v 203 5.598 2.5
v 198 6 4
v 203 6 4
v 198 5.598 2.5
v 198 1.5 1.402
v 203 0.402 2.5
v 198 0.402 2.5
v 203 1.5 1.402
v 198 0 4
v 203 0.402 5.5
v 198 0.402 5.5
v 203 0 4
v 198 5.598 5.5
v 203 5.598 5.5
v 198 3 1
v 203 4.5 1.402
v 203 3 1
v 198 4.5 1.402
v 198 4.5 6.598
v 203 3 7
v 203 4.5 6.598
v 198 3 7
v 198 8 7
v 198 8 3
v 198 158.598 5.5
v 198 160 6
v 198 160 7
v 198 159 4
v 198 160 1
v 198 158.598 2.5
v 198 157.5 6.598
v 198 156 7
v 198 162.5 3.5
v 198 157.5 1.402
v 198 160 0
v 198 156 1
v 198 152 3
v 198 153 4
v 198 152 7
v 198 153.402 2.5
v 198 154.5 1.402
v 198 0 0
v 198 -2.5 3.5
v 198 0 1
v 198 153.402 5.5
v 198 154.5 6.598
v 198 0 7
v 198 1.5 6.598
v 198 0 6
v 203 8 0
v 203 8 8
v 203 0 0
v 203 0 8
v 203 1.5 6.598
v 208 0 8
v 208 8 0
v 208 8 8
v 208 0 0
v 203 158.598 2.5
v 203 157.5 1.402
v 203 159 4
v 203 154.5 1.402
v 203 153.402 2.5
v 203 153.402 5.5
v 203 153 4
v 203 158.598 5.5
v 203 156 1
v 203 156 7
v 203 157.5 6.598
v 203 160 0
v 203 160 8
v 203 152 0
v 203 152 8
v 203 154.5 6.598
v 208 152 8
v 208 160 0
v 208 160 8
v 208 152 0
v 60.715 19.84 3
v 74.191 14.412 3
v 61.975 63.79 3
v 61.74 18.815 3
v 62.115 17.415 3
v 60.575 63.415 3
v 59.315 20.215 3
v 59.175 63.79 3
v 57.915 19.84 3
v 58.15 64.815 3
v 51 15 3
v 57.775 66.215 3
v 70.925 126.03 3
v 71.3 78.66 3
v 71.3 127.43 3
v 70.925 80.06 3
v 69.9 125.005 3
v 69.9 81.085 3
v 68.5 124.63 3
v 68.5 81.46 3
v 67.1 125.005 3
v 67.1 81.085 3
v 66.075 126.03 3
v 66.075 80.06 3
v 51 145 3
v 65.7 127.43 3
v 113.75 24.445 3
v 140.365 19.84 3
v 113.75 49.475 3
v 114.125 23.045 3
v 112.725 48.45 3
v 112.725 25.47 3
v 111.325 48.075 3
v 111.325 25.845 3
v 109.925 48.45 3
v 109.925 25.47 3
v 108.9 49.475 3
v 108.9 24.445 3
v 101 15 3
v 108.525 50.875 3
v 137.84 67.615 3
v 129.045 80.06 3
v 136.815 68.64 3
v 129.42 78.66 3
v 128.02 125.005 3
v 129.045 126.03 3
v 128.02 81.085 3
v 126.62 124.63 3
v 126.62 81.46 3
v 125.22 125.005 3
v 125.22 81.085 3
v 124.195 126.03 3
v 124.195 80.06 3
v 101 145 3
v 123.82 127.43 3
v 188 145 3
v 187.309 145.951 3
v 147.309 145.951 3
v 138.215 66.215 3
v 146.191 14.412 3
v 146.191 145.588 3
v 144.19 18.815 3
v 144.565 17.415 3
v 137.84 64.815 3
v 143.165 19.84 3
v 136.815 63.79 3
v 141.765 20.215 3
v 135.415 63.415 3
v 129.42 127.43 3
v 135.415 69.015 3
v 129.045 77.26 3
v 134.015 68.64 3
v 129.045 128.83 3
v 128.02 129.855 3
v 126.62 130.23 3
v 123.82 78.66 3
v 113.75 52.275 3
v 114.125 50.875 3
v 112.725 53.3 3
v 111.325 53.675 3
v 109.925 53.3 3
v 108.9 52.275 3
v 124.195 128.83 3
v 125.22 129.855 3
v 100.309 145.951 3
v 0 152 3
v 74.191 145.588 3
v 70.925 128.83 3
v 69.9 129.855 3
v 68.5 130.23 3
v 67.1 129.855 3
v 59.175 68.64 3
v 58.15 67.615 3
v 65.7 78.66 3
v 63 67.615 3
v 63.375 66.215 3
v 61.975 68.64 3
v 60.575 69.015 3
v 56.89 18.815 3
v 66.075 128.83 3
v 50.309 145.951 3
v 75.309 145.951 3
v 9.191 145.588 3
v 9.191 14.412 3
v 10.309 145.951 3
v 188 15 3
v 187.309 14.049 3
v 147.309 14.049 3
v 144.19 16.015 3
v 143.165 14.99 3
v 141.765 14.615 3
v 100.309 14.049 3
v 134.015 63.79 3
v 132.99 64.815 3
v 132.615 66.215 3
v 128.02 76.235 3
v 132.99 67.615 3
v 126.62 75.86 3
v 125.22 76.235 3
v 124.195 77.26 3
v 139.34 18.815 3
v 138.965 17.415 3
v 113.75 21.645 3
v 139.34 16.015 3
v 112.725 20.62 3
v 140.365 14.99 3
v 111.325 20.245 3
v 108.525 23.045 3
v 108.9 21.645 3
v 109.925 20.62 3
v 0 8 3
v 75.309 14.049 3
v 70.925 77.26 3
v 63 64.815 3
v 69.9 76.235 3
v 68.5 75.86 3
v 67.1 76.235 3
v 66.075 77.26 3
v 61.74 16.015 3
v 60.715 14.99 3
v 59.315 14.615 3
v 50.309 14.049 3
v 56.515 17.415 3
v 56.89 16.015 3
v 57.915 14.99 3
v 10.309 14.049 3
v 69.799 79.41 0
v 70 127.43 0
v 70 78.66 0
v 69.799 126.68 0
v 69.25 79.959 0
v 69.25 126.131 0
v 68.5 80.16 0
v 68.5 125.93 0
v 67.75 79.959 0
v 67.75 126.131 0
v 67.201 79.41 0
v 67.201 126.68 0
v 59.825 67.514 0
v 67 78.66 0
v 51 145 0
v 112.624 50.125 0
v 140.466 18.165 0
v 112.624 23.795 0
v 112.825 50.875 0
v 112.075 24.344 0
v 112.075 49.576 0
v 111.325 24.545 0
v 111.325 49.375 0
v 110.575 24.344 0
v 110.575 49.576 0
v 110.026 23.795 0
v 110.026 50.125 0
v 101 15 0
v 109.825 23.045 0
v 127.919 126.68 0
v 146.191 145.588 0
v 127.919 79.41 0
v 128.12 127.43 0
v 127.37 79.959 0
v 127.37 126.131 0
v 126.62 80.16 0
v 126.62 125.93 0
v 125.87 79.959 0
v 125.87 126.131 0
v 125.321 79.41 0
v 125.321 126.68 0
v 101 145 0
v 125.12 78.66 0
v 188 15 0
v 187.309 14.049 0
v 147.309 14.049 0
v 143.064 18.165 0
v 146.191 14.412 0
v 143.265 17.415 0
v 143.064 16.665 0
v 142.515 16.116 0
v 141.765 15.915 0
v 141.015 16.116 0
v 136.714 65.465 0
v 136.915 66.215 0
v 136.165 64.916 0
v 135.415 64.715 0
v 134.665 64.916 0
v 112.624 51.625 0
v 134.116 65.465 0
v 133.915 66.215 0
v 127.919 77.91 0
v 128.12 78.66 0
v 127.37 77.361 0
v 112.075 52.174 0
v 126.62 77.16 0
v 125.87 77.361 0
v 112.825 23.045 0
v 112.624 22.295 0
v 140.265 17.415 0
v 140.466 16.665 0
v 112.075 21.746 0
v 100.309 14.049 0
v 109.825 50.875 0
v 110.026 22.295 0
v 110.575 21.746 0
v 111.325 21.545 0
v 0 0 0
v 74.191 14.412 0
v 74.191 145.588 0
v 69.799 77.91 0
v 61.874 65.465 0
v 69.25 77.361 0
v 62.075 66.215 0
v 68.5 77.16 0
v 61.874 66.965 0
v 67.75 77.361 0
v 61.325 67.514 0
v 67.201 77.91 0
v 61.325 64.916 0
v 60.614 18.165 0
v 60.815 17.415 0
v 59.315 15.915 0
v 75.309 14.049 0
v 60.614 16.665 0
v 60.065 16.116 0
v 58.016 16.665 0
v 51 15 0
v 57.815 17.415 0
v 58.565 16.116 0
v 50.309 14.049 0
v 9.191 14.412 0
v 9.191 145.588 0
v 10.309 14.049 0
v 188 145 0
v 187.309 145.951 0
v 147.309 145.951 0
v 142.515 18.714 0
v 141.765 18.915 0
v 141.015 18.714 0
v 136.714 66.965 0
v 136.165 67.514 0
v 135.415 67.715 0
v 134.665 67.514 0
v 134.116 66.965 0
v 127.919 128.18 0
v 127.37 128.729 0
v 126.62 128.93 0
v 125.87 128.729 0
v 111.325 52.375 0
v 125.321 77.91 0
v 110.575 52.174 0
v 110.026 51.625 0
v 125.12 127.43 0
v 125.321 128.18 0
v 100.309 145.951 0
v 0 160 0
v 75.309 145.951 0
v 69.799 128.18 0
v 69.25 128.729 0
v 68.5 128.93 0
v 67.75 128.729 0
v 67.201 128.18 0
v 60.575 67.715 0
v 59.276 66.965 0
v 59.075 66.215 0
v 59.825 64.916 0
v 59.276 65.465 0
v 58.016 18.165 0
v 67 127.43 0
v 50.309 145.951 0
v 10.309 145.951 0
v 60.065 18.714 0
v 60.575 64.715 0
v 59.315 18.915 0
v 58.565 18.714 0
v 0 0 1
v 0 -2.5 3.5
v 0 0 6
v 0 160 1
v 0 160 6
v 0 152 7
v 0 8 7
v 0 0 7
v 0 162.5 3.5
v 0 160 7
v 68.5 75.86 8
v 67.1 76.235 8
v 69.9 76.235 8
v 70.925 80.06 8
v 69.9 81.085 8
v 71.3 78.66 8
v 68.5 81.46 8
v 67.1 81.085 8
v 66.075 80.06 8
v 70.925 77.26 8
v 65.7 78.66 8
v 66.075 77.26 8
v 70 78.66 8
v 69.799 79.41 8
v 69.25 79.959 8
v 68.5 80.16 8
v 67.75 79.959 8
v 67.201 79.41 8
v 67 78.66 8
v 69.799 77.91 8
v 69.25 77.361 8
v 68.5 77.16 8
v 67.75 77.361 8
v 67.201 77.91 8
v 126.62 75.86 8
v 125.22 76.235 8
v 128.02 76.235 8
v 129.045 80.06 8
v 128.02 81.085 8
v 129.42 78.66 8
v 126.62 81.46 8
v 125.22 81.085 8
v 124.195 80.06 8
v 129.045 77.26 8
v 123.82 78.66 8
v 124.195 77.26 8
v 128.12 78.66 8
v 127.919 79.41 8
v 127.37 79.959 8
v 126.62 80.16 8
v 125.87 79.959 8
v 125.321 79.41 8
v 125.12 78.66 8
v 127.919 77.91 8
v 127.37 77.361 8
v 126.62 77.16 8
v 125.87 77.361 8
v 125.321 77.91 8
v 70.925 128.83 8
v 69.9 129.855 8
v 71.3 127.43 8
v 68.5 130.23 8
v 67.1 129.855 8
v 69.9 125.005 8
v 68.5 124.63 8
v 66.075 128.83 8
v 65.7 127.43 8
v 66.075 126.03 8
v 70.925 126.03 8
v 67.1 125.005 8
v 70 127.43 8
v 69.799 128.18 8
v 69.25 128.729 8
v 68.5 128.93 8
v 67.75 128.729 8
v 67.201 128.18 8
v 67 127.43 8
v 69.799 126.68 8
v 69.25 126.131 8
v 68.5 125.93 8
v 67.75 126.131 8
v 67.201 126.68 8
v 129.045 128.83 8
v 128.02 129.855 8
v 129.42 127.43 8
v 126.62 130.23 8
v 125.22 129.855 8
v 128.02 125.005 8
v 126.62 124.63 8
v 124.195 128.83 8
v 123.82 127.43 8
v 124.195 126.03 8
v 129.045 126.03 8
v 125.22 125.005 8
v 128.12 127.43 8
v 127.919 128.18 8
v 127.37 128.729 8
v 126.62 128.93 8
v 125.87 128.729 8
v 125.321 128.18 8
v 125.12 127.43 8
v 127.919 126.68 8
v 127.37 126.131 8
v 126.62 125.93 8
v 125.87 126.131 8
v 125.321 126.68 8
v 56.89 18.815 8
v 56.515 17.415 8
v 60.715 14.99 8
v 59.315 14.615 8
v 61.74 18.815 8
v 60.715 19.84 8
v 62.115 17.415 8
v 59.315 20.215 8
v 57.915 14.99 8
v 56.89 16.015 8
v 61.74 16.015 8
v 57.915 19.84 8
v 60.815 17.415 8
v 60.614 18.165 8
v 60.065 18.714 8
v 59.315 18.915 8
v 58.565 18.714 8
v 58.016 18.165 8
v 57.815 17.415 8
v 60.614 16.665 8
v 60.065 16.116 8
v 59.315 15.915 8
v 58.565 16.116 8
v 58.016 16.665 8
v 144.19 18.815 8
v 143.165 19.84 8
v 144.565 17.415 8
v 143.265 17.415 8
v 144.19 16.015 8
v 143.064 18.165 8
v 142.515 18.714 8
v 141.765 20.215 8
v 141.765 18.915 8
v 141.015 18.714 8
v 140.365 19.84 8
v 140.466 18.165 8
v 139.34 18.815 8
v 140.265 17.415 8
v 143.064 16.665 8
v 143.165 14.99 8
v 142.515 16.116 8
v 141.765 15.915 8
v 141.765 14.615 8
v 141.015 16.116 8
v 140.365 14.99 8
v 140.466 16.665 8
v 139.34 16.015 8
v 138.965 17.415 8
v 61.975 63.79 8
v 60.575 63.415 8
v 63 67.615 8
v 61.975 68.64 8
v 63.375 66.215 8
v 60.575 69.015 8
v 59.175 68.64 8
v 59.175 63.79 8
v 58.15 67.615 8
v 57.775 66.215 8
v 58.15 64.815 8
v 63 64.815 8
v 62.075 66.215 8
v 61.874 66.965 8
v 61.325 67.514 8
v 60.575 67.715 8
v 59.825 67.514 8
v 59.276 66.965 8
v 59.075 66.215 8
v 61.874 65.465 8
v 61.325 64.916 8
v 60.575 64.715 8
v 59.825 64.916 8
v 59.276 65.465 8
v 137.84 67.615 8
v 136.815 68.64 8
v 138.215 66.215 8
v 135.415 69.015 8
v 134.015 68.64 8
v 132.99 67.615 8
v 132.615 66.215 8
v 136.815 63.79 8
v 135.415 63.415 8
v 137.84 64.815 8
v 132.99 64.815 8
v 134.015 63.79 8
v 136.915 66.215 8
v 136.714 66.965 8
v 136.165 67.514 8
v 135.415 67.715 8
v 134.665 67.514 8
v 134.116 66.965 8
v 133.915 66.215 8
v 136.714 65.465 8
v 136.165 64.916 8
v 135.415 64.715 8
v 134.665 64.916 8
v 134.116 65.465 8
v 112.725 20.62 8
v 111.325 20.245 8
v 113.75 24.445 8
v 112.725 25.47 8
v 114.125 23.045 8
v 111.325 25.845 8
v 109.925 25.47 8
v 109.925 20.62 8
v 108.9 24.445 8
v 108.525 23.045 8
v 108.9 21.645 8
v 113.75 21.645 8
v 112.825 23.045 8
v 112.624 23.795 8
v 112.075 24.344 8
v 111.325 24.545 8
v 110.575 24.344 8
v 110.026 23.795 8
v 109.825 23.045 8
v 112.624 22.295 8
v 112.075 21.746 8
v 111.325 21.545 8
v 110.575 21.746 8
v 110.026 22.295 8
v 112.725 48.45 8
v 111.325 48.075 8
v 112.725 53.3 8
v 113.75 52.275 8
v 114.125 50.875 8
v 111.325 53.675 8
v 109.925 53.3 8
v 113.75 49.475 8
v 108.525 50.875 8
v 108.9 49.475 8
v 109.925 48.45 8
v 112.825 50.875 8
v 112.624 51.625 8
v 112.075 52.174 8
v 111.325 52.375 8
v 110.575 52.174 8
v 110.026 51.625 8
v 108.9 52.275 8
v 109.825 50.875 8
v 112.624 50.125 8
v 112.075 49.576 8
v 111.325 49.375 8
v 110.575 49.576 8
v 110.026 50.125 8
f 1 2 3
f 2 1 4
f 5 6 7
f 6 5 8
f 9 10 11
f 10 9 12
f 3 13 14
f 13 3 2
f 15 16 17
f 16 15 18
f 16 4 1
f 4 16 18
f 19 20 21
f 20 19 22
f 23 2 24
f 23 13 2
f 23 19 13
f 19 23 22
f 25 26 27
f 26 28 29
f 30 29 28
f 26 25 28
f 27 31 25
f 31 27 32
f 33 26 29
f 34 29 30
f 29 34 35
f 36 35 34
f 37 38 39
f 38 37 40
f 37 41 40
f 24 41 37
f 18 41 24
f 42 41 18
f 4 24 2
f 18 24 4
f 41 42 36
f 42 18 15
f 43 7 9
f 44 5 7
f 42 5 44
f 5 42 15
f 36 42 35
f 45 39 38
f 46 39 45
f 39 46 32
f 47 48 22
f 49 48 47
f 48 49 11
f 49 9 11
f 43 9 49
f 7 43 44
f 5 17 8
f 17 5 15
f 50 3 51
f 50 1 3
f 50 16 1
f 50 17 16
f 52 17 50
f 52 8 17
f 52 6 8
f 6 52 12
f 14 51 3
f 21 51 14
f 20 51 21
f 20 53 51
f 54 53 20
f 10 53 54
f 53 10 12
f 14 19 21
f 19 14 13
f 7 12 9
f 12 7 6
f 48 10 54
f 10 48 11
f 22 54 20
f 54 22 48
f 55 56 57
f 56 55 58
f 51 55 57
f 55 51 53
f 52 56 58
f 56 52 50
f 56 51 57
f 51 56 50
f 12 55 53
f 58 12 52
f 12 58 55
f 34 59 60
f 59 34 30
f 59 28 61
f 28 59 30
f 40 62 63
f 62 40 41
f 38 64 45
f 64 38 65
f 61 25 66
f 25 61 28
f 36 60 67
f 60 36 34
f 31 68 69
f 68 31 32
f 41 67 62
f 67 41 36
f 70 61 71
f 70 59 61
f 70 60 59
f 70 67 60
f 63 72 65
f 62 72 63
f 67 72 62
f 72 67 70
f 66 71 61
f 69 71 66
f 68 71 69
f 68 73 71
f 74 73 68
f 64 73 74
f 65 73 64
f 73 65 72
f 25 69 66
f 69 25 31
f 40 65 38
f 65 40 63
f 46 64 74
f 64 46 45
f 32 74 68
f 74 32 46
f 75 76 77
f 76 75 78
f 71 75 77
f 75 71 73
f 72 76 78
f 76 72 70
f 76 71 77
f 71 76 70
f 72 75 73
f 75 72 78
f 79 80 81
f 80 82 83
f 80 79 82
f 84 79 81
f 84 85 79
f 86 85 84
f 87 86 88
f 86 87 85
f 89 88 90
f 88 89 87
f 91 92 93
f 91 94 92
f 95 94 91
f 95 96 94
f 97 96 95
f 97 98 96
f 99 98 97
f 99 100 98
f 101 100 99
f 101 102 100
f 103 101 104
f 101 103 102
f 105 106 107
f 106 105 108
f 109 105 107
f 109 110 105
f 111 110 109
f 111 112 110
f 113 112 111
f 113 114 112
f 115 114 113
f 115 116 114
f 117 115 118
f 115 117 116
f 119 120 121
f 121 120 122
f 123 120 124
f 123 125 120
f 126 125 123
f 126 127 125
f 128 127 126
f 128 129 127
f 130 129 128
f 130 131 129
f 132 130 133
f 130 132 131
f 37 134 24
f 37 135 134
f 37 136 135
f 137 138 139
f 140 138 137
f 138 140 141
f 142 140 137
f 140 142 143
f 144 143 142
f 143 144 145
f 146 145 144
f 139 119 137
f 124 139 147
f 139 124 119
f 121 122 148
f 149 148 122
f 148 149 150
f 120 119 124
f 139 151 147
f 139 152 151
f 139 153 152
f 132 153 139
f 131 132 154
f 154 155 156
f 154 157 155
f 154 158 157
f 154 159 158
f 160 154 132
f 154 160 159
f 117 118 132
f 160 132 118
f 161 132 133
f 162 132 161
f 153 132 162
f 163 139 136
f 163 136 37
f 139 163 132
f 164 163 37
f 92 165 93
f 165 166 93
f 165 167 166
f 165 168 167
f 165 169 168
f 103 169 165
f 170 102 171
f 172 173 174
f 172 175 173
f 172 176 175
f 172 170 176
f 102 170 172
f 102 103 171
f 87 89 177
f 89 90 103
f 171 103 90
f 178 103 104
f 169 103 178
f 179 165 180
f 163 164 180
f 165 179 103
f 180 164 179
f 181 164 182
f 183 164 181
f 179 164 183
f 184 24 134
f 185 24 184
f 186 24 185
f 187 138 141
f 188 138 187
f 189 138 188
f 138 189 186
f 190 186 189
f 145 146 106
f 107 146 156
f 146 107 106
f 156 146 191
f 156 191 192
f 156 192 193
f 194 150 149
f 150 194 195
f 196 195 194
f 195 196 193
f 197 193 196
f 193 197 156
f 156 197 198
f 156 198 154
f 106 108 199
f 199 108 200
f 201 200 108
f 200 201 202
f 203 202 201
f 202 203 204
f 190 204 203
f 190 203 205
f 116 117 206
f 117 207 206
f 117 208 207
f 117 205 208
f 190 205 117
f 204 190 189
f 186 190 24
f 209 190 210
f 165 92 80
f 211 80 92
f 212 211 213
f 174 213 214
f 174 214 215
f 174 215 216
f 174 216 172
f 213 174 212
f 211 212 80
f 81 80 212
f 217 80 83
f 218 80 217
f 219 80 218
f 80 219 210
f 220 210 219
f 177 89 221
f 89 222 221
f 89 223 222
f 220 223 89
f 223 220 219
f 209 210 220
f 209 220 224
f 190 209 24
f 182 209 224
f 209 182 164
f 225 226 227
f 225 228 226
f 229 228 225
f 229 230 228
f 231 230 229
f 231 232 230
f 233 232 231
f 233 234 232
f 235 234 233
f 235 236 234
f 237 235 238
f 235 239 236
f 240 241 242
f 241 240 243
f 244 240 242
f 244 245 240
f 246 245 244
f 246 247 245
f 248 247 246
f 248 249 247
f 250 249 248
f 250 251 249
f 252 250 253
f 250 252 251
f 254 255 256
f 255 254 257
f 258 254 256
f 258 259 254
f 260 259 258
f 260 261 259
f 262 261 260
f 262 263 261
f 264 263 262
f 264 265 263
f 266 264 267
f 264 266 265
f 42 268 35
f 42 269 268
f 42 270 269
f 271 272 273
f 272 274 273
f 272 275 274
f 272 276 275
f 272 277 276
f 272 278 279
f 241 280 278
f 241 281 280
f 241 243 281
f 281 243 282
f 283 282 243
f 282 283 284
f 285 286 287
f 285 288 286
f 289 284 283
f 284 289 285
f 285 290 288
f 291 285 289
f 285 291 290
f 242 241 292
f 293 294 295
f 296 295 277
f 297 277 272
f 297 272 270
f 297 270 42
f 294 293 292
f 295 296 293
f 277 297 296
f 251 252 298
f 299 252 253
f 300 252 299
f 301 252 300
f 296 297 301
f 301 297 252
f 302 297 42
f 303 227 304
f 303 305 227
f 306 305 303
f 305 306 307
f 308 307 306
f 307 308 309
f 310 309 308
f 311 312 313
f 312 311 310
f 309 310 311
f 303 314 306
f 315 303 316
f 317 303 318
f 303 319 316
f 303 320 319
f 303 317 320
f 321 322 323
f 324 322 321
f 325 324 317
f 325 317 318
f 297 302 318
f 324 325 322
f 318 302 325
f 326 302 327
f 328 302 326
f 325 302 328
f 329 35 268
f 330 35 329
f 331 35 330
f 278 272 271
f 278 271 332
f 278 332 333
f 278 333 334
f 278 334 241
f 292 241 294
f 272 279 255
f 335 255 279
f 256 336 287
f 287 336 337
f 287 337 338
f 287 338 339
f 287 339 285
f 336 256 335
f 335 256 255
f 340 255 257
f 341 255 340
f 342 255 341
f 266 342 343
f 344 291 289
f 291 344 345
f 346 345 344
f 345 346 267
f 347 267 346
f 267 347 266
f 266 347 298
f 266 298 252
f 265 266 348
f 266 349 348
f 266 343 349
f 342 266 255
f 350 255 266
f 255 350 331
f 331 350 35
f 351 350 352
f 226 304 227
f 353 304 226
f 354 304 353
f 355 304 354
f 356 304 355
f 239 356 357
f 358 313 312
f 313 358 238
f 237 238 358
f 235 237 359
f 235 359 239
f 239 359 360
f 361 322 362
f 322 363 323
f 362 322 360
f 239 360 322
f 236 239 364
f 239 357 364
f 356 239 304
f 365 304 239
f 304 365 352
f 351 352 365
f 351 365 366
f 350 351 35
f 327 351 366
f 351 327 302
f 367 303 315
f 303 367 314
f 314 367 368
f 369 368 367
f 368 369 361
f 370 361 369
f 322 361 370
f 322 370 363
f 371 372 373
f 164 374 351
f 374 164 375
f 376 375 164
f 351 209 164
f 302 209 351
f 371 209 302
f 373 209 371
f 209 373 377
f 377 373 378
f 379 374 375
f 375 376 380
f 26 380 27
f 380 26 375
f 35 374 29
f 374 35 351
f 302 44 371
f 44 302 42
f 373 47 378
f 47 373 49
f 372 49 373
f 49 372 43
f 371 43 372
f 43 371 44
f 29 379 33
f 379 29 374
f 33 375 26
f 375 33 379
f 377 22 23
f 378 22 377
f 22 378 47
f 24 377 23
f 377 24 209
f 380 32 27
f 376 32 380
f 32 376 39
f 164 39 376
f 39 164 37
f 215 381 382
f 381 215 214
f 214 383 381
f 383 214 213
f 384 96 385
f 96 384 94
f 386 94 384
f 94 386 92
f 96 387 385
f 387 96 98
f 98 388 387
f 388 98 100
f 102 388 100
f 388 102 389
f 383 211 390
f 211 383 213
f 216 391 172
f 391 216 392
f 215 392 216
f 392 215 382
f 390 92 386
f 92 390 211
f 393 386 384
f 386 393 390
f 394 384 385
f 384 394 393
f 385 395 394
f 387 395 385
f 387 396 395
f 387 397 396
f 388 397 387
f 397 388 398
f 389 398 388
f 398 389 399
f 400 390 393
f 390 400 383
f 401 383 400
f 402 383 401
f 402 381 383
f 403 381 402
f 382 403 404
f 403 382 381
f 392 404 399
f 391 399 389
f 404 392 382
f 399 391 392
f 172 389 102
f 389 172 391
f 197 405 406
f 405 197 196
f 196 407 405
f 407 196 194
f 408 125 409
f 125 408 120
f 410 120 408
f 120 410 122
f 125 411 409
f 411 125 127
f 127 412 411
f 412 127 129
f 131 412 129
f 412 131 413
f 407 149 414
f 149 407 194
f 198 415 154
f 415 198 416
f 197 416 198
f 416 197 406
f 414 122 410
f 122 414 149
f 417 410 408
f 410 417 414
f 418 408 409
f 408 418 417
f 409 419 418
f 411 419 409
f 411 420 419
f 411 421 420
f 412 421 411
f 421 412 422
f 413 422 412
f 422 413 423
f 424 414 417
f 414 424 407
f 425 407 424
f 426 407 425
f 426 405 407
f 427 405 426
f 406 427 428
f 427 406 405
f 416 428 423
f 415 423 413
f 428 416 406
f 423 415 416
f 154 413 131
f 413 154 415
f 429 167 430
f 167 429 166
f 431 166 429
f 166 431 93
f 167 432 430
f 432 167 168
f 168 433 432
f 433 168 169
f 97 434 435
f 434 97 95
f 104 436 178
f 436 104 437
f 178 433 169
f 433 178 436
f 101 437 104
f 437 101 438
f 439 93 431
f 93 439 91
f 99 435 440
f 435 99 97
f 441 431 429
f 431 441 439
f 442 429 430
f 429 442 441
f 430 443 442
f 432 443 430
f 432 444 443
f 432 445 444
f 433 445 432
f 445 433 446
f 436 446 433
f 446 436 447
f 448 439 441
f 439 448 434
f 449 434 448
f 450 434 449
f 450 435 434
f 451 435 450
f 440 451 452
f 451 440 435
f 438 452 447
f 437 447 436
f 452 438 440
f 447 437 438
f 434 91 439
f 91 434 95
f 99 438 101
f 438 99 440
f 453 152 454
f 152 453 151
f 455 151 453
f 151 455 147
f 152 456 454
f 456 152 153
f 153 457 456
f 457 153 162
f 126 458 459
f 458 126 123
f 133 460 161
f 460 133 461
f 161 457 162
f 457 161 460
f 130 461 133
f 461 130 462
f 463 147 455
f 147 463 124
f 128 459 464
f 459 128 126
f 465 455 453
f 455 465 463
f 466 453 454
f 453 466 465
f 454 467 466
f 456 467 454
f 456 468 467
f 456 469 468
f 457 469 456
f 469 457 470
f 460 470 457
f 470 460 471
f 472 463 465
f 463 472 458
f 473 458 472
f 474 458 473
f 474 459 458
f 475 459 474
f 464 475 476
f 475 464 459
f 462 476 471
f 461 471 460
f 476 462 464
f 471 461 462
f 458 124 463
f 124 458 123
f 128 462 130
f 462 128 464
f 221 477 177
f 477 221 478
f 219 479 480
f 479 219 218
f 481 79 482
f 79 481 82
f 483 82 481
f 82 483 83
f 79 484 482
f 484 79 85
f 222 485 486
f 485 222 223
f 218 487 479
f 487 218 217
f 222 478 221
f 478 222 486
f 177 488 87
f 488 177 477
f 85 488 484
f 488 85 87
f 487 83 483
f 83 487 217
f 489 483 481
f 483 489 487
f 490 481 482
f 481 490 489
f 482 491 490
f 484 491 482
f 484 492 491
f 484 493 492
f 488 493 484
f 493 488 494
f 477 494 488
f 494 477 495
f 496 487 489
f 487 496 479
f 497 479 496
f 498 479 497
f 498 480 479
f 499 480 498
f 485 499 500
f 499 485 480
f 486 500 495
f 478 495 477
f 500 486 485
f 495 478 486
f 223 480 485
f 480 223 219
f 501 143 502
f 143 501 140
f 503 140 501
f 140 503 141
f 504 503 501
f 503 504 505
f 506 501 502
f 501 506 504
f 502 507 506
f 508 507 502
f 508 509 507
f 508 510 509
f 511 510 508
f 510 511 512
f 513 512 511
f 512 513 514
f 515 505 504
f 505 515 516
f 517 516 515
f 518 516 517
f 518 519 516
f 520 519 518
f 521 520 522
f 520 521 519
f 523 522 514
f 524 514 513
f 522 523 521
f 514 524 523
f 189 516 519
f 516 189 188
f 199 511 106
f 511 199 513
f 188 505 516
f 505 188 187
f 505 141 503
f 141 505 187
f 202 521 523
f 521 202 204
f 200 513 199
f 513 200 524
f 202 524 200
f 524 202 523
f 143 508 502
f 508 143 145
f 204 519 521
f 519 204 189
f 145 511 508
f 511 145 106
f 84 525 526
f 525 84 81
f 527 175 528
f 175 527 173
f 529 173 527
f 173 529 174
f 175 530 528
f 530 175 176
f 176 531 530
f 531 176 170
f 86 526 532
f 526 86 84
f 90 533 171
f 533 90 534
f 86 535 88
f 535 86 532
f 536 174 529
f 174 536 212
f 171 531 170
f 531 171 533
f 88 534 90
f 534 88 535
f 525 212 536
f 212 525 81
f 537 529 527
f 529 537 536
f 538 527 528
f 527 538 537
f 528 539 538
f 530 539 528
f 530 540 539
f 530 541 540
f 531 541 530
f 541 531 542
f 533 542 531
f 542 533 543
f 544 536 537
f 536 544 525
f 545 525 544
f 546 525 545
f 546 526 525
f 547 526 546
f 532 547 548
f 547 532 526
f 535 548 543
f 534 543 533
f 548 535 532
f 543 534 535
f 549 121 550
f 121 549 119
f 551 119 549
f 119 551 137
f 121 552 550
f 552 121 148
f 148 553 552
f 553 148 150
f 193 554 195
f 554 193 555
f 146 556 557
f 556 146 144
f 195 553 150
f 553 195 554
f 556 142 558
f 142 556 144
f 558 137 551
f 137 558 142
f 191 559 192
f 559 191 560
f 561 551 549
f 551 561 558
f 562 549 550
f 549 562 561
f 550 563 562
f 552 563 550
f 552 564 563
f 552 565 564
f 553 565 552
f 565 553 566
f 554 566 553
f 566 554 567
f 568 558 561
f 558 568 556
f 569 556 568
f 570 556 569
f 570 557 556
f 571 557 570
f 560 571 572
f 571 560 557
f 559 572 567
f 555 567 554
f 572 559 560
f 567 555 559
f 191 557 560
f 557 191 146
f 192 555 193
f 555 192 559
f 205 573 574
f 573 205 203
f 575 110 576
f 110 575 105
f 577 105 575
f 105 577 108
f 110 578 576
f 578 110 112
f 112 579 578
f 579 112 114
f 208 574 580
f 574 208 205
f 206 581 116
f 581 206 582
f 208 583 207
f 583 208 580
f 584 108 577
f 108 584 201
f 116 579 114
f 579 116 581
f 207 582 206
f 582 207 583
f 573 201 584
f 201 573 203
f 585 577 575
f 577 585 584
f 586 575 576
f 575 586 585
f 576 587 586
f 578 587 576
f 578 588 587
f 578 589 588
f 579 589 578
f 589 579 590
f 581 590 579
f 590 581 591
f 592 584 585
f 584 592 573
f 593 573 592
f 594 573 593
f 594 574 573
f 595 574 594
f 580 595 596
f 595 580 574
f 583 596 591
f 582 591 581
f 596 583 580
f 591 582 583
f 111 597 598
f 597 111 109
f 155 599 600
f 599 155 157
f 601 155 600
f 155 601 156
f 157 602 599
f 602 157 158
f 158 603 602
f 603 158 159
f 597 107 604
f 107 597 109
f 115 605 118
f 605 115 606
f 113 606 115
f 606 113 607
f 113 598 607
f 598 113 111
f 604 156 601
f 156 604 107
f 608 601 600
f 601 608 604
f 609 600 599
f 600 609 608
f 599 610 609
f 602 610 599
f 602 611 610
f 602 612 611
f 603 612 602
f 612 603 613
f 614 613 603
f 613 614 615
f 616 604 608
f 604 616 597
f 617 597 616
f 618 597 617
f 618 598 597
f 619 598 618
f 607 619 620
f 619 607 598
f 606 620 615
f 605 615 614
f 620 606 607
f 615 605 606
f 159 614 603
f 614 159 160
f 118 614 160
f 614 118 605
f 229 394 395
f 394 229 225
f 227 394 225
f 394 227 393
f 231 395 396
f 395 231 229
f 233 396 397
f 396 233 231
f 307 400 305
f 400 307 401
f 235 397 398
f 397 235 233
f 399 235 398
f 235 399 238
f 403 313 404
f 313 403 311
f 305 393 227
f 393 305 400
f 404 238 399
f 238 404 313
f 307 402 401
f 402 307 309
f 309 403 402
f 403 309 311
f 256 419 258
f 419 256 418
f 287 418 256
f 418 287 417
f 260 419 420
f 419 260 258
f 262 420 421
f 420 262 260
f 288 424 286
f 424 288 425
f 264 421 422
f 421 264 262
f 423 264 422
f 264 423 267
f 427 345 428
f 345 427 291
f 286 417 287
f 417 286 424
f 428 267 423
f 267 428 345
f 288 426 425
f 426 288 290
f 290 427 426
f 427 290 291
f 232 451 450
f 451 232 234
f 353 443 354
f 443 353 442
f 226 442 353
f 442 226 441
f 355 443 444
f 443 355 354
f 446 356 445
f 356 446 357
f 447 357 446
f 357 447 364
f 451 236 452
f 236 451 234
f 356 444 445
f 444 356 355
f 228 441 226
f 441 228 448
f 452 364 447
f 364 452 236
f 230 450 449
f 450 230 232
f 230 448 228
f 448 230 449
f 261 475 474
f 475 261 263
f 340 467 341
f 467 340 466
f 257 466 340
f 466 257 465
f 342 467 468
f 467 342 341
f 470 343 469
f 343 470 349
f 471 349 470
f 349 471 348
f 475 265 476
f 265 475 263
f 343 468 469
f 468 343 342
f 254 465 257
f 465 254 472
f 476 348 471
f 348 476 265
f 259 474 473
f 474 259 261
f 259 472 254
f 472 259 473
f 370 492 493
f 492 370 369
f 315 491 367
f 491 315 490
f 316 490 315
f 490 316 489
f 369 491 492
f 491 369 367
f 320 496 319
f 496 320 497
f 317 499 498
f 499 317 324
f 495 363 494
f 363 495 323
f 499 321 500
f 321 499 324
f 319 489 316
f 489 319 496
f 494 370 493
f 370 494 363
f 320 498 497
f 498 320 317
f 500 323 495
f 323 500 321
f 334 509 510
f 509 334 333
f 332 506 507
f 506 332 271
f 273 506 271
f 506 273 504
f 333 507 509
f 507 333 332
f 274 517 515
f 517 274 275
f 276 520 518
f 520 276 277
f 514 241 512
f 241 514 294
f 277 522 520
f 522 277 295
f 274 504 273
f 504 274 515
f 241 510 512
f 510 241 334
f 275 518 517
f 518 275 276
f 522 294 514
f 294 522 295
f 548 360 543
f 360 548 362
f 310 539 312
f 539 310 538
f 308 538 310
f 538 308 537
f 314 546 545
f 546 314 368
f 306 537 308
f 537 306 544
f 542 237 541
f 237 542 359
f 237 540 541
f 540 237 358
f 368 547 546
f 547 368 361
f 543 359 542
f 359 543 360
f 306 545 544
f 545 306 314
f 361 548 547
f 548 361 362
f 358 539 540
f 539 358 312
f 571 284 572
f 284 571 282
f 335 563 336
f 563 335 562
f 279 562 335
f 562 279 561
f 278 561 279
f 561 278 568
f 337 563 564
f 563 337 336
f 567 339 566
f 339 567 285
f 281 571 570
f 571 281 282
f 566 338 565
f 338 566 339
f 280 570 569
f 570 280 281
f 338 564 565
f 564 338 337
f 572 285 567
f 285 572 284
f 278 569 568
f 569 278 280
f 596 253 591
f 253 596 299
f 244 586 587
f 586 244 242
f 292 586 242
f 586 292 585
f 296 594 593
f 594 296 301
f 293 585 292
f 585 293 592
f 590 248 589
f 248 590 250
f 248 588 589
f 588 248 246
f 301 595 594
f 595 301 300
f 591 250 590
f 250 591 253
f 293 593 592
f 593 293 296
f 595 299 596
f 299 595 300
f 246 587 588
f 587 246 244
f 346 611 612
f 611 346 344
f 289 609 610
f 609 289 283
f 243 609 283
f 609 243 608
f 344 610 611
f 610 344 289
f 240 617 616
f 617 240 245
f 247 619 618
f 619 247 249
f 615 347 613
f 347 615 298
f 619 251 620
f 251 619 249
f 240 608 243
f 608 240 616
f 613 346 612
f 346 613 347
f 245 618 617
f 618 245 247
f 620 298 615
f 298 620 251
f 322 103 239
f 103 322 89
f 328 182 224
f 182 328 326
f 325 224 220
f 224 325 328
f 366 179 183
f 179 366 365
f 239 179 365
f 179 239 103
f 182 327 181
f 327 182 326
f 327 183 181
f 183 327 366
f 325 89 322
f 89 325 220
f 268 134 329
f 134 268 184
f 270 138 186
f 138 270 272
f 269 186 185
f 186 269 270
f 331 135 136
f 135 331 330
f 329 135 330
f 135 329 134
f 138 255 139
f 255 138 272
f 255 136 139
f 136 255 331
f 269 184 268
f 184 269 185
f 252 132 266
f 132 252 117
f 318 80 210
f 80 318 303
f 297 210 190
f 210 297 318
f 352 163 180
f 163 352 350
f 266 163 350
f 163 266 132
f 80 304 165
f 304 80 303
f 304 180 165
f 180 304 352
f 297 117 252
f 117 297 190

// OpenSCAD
// file: bbs_shapes.scad
//
// This is a catalogu of shapes that are used in other structures.  Each shape is
// parameterized to make them more flexible.
//
//===================================
// Triangular prism type 1.  This takes the form of an isosolese right triangle.
// The triangle is oriented with the hypotonuse in the y direction.  Extrusion is in the
// z direction.  Origin is at one end of the hypotonuse.
//
// Parameters
// s - size of triangle (length of hypotonuse)
// l - length of prism
//
module bbs_prism1(s, l)
{
    linear_extrude(height=l) polygon([[0, 0], [0, s], [s/2, s/2]]);
}
//
//===================================
// Triangular prism type 2.  This takes the form of an isosolese right triangle.
// The triangle is oriented with the right angle at the origin.  Extrusion is in the
// z direction.
//
// Parameters
// s - size of triangle (length of sides)
// l - length of prism
//
module bbs_prism2(s, l)
{
    linear_extrude(height=l) polygon([[0, 0], [0, s], [s, 0]]);
}
//
//===================================
// Fillet.  This is a square with a circle removed from it.  The circle
// has a radius equal to the square's sides and is positioned at one of the corners.  The
// length is in the z  direction.
//
// Parameters
// s - size of fillet
// l - length of extrusion
//
module bbs_fillet(s, l)
{
    difference()
    {
        cube([s, s, l]);
        translate([s, s, -0.1]) cylinder(r=s, h=l+0.2);
    }
}
//
//===================================
// Spacer.  This is a cylinder with a cylinder removed from the center of it.  It
// would typically be used to around a bolt to add some space like a standoff or
// as a washer.
//
// Parameters
// od - outside diameter
// id - inside diameter
// height - height
//
module bbs_spacer(od, id, height)
{
    difference()
    {
        cylinder(r=od/2, h=height, $fn=20);
        translate([0, 0, -0.1]) cylinder(r=id/2, h=height + 0.2, $fn=20);
    }
}
//
// Examples
//
//bbs_prism1(3, 5);
//translate([0, 7, 0]) bbs_prism2(3, 5);
//translate([7, 0, 0]) bbs_fillet(3, 5);
//bbs_spacer(23, 10, 16);
bbs_spacer(6, 4, 2);
// file: bbs_pins.scad
//
// A pin header with 0.1 inch spacing
//
pitch = 2.54;

module bbs_header(pins)
{
    for (i = [1 : pins])
    {
        translate([(i-1)*pitch, 0, -9]) cylinder(h=11.57, r=0.5);
        translate([(i-1)*pitch, 0, -9 + 5.93]) cylinder(h=2.27, r=1.5);
    }
}

bbs_header(10);
// file: bbs_tray.scad
//
// Basic sliding tray to mount in a rack.  Varients of this tray can
// hold different electronic devices.  The knobs parameter is a boolean
// to determine in knobs are added to the tray (the default) or not.
// One may wish to omit the knobs if, for example, one wants a panel to
// cover the tray.
//
use <bbs_shapes.scad>
length=198;
width=160;
//module prism(l)
//{
//    linear_extrude(height=l) polygon([[0,0], [0,5], [2.5,2.5]]);
//}
module bbs_tray(knobs=true)
{
    difference()
    {
        union()
        {
            cube([length, width, 3], center=false); // Base
            translate([0, 0, 6])rotate([0, 90, 0]) rotate([0, 0, -90]) bbs_prism1(5, length); // Rail
            translate([0, width, 1])rotate([0, 90, 0]) rotate([0, 0, 90]) bbs_prism1(5, length); // Rail
            translate([0, 0, 0]) cube([length, 8, 7], center=false); // Side
            translate([0, width - 8, 0]) cube([length, 8, 7], center=false); // Side
//
            if (knobs)
            {
                translate([length, 3, 4]) rotate([0, 90, 0]) cylinder($fn=12, h=5, r=3);
                translate([length + 5, 0, 0]) cube([5, 8, 8], center=false); // Knob
                translate([length, width - 4, 4]) rotate([0, 90, 0]) cylinder($fn=12, h=5, r=3);
                translate([length + 5, width - 8, 0]) cube([5, 8, 8], center=false); // Knob
            }
        }
        union()
        {
        }
    }
}

bbs_tray();
// file: bbs_arduino.scad
//
// Modules for Arduinos.
//
use <bbs_pins.scad>

//--------------------------------------------------------------------------------------
// This is a model for the basic Arduino Uno.  The standoff model will probably work
// for any of the other small Arduino boards.
//
module bbs_arduino_uno()
{
    hole_rad = 3.06/2;
    difference()
    {
        union()
        {
            cube([68.84, 53.35, 2]);
            translate([-1.82, 4.09, 2]) cube([14.10, 9.60, 10.82]); // power connector
            translate([-6.22, 32.30, 2]) cube([16.40, 12.06, 11.00]); // USB connector
            translate([26.21, 1.97, 2]) cube([38.72, 2.50, 8.63]); // connector
            translate([17.56, 42.07, 2]) cube([47.88, 2.47, 8.51]); // connector
        }
        bbs_arduino_uno_standoffs(2.2, hole_rad, 20);
    }
}
//
// Standoffs for Arduino Uno.  This should also work for other small board Arduinos.
//
module bbs_arduino_uno_standoffs(height, radius, facets)
{
    hole_rad = 3.06/2;
    union()
    {
        translate([12.80 + hole_rad, 1.31 + hole_rad, 0]) cylinder(r=radius, h = height, $fn=facets);
        translate([64.64 + hole_rad, 6.50 + hole_rad, 0]) cylinder(r=radius, h = height, $fn=facets);
        translate([14.07 + hole_rad, 49.27 + hole_rad, 0]) cylinder(r=radius, h = height, $fn=facets);
        translate([64.59 + hole_rad, 34.21 + hole_rad, 0]) cylinder(r=radius, h = height, $fn=facets);
    }
}


//--------------------------------------------------------------------------------------
module bbs_arduino_mega2560()
{
    hole_rad = 3.15/2;
    difference()
    {
        union()
        {
            cube([99.22, 53.5, 1.8]);
            cube([101.64, 40.41, 1.8]);
            translate([-2.36, 4.40, 1.8]) cube([13.84, 9, 10.95]); // power connector
            translate([-6.22, 32.41, 1.8]) cube([16.28, 12, 10.76]); // USB connector
            translate([31.66, 1.69, 1.8]) cube([61.3, 2.51, 8.48]); // connectors
            translate([93.15, 6.25, 1.8]) cube([5, 46.04, 9.67]); // connectors
            translate([22.44, 46.67, 1.8]) cube([64.34, 2.46, 8.47]); // connectors
        }
        translate([0, 0, -0.1]) bbs_arduino_mega2560_standoffs(2, hole_rad, 20);
    }
}
//
// The standoff pattern also works for the Arduino Due and will probably work for the Mega
// as well.
//
module bbs_arduino_mega2560_standoffs(height, radius, facets)
{
    hole_rad = 3.15/2;
    union()
    {
        translate([12.74 + hole_rad, 0.84 + hole_rad, 0]) cylinder(r=radius, h = height, $fn=facets);
        translate([95.19 + hole_rad, 0.84 + hole_rad, 0]) cylinder(r=radius, h = height, $fn=facets);
        translate([14 + hole_rad, 49.64 + hole_rad, 0]) cylinder(r=radius, h = height, $fn=facets);
        translate([88.84 + hole_rad, 49.64 + hole_rad, 0]) cylinder(r=radius, h = height, $fn=facets);
        translate([64.75 + hole_rad, 6.47 + hole_rad, 0]) cylinder(r=radius, h = height, $fn=facets);
        translate([64.75 + hole_rad, 34.30 + hole_rad, 0]) cylinder(r=radius, h = height, $fn=facets);
    }
}
//--------------------------------------------------------------------------------------
bbs_arduino_uno();

translate([0, 0, -40]) bbs_arduino_mega2560();
// file: bbs_RaspberryPi.scad
use <bbs_pins.scad>
//
// Module for a Raspberry Pi 3.  This will probably also work for the Pi 2.  The large block over the
// processor is the space for a heatsink.
//
length = 85;
width = 56.11;
height = 2;
hole = 1.28;

module rPi3_standoffs(height, radius, facets)
{
    union()
    {
        translate([22.22 + hole, 2.38 + hole, 0]) cylinder($fn=facets, h=height, r=radius);
        translate([80.34 + hole, 2.38 + hole, 0]) cylinder($fn=facets, h=height, r=radius);
        translate([22.22 + hole, 51.15 + hole, 0]) cylinder($fn=facets, h=height, r=radius);
        translate([80.34 + hole, 51.15 + hole, 0]) cylinder($fn=facets, h=height, r=radius);
    }
}
module bbs_rPi3()
{
    difference()
    {
        union()
        {
            cube([length, width, height], center=false);
            translate([-2, 2, height]) cube([17, 13.2, 15.25], center=false); // USB
            translate([-2, 20.52, height]) cube([17, 13.2, 15.25], center=false); // USB
            translate([-2, 38.34, height]) cube([21.32, 16.1, 13.78], center=false); // Ethernet
            translate([28.48, 2, height]) rotate([180, 0, 0]) bbs_header(20); // Connector
            translate([28.48, 4, height]) rotate([180, 0, 0]) bbs_header(20); // Connector
            translate([53.41, 16.56, height]) cube([14.78, 14.89, 16.3], center=false); // Heatsink
            translate([71.68, 12.80, -1.58]) cube([13.18, 12.02, 1.60], center=false); // SD card
            translate([77.03, 17.21, height]) cube([4, 22.35, 5.09], center=false); // Display
            translate([28.83, 44.66, height]) cube([6.82, 14.44, 5.29], center=false); //Audio
        }
        translate([0, 0, -2]) rPi3_standoffs(5, hole, 12);
    }
}

bbs_rPi3();
// main file
//
// Carrier for Rapsberry Pi 3
//
// A Raspberry Pi 3 is mounted on the carrier and then the carrier slides into
// a frame.
//
use <bbs_RaspberryPi.scad>
use <bbs_arduino.scad>
//use <bbs_half_breadboard.scad>
use <bbs_tray.scad>
//use <bbs_lcd7.scad>
standoff = 5;

pi_x = 45;
pi_y = 75;
ar_x = 45;
ar_y = 15;

module bbs_pi_carrier()
{
    difference()
    {
        union()
        {
            bbs_tray();
            translate([pi_x, pi_y, 3]) rPi3_standoffs(standoff, 2.8, 12);
            translate([ar_x, ar_y, 3]) bbs_arduino_mega2560_standoffs(standoff, 2.8, 12);
        }
        union()
        {
            translate([pi_x, pi_y, -2]) rPi3_standoffs(standoff + 6, 1.5, 12);
            translate([ar_x, ar_y, -2]) bbs_arduino_mega2560_standoffs(standoff + 6, 1.5, 12);
            translate([10, 15, -1]) minkowski()
            {
                cube([40, 130, 10]);
                cylinder(r=1, h=10);
            }
            translate([147, 15, -1]) minkowski()
            {
                cube([40, 130, 10]);
                cylinder(r=1, h=10);
            }
            translate([75, 15, -1]) minkowski()
            {
                cube([25, 130, 10]);
                cylinder(r=1, h=10);
            }
        }
    }
}

bbs_pi_carrier();
//color("red") translate([pi_x, pi_y, standoff + 4]) bbs_rPi3();
//color("green") translate([ar_x, ar_y, standoff + 4]) bbs_arduino_mega2560();
